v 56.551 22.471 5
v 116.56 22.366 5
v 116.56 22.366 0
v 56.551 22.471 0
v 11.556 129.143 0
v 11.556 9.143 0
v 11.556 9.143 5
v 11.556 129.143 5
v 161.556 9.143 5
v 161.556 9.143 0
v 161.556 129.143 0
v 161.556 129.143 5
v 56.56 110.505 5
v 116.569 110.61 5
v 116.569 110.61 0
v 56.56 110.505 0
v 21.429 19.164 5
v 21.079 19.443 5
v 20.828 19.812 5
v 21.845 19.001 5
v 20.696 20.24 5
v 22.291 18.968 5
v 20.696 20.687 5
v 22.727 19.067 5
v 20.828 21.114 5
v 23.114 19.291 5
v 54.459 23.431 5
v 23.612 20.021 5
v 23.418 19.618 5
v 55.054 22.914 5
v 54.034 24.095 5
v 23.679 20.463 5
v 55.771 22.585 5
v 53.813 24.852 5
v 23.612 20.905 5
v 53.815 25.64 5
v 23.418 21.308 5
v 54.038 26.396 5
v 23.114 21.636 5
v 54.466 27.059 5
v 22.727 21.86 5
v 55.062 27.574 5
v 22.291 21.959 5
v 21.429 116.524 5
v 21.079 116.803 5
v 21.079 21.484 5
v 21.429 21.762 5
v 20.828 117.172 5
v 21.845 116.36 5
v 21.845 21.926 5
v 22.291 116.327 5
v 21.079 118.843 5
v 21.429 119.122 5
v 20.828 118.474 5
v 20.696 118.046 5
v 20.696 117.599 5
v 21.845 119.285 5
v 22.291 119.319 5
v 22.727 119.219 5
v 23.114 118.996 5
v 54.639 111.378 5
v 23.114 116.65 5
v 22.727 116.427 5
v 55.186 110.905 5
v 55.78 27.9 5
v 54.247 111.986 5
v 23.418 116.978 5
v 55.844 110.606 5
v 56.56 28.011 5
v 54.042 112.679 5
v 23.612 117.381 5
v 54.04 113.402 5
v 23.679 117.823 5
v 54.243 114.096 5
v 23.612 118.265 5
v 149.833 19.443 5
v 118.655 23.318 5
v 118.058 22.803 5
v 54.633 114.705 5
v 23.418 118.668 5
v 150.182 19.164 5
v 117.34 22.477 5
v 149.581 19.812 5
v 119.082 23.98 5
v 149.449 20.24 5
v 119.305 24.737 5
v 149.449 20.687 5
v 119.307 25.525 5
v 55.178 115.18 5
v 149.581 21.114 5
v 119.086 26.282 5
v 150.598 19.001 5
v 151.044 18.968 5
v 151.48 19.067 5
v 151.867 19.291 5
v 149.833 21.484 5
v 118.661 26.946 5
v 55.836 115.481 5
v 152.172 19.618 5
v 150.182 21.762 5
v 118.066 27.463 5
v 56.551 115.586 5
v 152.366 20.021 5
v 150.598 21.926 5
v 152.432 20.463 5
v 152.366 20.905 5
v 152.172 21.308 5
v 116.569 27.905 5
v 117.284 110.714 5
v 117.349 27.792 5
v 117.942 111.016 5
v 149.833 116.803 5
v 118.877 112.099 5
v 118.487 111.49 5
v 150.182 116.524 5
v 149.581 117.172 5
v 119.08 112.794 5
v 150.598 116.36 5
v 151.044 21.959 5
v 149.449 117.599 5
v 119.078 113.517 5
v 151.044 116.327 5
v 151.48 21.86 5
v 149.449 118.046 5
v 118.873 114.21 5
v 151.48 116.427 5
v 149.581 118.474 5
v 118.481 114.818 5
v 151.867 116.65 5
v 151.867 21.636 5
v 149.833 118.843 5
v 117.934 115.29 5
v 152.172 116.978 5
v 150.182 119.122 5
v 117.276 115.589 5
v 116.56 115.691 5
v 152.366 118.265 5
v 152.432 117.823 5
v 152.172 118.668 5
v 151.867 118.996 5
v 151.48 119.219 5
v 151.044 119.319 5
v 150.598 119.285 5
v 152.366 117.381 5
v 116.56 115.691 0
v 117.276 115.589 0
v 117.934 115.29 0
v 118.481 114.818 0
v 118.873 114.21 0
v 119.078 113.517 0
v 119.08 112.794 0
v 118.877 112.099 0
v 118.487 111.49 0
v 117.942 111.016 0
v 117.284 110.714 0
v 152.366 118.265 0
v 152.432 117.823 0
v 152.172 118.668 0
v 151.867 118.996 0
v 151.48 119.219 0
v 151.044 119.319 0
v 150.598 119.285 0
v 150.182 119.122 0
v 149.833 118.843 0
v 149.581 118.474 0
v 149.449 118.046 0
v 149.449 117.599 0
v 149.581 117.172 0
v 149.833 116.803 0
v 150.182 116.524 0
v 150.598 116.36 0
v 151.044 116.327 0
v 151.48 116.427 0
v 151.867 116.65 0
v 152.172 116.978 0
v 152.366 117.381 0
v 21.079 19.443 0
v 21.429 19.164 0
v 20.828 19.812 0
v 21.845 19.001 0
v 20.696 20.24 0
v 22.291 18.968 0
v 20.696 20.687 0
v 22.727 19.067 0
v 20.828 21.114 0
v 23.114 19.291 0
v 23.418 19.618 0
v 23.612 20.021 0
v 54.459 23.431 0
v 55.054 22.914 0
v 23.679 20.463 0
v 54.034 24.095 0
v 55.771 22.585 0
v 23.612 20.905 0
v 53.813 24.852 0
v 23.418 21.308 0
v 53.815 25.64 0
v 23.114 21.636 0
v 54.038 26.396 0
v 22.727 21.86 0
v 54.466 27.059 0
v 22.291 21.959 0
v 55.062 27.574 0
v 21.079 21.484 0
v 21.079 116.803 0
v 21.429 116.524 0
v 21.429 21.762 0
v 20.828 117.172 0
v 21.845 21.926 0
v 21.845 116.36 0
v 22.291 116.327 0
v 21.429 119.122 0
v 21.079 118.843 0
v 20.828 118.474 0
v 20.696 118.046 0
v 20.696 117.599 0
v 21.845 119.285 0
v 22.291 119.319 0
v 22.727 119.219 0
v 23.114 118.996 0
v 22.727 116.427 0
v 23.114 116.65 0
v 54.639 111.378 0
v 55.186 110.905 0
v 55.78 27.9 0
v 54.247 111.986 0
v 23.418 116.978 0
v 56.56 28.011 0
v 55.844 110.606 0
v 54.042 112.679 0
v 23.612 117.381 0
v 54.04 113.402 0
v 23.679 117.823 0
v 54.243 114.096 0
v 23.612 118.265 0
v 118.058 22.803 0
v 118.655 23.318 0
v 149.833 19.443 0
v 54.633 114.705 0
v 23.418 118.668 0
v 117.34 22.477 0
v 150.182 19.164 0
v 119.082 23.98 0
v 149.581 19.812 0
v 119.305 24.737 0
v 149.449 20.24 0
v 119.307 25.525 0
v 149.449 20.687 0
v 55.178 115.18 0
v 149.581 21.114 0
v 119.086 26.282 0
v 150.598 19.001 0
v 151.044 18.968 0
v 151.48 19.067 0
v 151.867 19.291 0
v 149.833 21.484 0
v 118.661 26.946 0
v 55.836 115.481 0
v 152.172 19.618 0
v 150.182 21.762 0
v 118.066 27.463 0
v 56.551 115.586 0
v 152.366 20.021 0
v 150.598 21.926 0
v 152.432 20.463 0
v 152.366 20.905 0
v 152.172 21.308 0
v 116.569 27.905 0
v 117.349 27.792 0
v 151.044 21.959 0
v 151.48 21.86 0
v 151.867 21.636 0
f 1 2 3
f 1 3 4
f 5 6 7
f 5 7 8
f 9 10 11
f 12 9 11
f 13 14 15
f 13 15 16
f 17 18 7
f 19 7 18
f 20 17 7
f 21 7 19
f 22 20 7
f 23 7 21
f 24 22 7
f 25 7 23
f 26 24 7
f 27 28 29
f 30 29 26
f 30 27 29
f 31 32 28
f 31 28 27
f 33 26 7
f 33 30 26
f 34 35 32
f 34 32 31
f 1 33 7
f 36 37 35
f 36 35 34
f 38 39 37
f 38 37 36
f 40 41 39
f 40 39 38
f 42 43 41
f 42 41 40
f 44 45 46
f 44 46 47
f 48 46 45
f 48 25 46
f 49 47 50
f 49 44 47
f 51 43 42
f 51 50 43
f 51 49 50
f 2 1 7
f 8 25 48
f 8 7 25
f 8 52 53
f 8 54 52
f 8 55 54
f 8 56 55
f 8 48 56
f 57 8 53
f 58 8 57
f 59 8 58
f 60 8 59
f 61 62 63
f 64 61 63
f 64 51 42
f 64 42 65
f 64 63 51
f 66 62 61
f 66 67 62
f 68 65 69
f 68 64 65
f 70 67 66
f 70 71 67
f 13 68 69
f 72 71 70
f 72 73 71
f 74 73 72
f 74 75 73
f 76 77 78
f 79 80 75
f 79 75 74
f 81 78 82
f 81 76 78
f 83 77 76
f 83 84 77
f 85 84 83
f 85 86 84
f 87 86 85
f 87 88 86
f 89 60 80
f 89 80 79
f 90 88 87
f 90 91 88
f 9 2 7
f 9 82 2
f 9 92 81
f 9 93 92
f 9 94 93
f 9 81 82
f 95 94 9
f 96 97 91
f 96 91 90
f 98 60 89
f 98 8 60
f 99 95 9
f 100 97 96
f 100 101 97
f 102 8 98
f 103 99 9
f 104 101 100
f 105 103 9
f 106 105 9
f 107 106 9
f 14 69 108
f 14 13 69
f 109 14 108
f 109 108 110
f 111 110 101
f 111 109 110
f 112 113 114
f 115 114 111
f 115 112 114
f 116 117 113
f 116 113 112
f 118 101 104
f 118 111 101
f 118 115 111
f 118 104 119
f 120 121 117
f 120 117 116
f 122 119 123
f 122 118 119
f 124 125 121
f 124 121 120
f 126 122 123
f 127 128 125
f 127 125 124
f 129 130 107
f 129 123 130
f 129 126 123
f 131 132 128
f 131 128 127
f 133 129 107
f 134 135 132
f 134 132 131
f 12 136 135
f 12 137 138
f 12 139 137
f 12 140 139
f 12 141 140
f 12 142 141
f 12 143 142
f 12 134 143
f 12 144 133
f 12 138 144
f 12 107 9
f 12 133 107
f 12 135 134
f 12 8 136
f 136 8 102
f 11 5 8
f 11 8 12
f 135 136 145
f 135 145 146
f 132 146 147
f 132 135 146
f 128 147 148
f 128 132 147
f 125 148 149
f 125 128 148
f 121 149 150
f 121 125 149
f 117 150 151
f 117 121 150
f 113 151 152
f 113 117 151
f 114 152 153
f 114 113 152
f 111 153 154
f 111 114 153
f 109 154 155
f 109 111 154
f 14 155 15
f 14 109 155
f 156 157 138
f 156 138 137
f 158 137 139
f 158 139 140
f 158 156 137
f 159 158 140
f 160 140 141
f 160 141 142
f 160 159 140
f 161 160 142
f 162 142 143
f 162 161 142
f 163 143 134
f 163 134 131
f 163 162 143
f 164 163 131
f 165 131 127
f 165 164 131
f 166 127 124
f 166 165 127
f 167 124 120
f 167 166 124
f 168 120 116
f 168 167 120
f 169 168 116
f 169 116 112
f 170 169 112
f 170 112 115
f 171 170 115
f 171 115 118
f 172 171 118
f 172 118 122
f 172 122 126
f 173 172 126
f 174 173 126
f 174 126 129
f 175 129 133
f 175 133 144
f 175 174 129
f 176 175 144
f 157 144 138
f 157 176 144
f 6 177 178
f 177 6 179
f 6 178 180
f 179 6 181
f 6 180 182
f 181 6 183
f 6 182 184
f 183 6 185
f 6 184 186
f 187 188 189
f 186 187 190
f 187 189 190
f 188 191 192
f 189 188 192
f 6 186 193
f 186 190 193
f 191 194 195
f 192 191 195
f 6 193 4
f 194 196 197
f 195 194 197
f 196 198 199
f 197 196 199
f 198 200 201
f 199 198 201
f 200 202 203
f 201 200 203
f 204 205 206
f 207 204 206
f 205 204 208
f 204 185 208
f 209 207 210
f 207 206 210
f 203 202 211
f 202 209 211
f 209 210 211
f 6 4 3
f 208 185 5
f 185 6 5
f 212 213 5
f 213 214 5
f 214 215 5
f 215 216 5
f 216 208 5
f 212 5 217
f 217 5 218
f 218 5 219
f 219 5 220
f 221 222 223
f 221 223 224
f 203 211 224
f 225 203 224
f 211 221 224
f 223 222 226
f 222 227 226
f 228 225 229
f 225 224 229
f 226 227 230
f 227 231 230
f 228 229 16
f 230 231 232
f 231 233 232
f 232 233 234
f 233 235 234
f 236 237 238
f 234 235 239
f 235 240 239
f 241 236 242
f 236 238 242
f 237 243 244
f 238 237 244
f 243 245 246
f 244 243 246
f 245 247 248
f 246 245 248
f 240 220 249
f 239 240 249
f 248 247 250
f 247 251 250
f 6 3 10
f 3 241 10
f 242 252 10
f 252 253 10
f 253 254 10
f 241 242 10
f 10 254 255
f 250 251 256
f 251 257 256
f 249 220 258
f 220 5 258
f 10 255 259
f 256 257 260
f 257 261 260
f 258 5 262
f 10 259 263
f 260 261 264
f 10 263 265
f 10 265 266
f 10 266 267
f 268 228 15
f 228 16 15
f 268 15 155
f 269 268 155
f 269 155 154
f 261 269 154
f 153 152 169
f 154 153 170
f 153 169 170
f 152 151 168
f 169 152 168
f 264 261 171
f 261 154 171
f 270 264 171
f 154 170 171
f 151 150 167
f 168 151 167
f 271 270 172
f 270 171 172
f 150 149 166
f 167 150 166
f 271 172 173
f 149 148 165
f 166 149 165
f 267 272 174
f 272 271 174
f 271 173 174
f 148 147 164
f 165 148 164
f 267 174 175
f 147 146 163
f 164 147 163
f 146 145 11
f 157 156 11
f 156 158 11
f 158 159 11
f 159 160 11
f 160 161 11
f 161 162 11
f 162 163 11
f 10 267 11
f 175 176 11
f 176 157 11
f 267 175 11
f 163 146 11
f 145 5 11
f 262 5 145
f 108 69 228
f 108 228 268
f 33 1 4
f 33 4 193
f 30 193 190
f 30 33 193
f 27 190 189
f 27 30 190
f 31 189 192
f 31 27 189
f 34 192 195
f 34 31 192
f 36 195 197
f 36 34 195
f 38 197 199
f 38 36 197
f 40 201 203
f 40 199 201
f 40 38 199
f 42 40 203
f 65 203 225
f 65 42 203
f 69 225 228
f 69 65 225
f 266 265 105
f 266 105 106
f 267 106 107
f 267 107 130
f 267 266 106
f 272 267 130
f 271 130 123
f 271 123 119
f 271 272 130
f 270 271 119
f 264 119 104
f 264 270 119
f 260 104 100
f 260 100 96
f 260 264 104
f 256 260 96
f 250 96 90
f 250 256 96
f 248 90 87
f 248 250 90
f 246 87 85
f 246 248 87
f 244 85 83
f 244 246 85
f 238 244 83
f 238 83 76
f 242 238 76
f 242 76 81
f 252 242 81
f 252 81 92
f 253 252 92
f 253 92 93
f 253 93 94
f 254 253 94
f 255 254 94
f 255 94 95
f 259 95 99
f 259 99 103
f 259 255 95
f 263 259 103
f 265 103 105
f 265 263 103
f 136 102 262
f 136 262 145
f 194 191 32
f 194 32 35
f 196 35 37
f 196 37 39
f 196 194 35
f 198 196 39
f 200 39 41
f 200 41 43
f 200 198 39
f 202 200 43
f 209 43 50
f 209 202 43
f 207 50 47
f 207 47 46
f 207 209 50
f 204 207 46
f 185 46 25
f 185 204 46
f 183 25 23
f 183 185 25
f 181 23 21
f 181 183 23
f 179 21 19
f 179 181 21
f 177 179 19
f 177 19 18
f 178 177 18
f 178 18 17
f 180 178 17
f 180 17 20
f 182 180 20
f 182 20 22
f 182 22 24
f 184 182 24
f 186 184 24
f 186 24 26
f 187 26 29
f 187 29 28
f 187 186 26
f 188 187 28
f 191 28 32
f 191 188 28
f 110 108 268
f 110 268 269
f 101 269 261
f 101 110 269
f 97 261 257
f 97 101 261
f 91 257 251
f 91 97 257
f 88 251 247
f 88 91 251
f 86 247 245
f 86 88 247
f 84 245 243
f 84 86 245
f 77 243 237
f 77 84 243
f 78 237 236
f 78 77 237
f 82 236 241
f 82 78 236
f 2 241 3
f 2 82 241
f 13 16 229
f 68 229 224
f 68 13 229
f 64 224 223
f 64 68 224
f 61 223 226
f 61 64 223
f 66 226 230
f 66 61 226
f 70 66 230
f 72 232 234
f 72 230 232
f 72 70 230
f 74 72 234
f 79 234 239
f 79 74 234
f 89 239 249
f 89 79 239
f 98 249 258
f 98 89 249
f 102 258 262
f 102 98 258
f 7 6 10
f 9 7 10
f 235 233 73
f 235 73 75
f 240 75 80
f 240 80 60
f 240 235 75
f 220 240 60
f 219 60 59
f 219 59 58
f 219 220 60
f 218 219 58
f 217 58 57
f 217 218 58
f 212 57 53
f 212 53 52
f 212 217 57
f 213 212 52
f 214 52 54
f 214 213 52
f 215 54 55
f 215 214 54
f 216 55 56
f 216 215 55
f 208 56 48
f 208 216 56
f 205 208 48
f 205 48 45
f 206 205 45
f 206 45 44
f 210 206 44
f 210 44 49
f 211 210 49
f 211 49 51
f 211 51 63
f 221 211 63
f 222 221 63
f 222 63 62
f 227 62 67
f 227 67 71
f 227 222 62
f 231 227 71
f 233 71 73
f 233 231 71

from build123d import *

# Parameters (mm, degrees)
MODEL_W             = 150
MODEL_H             = 120
MODEL_R             = 1.5
BOSS_EXTRUDE1_DEPTH = 5
CUT_EXTRUDE1_DEPTH  = 207.889226408


with BuildPart() as part:
    # Model → Boss-Extrude1 (new body)
    with BuildSketch(Plane.XY):
        with Locations((86.555612284, 69.143083993)):
            Rectangle(MODEL_W, MODEL_H)
        with Locations((22.178986017, 117.822854057)):
            Circle(MODEL_R, mode=Mode.SUBTRACT)
        with Locations((150.932238551, 117.822854057)):
            Circle(MODEL_R, mode=Mode.SUBTRACT)
        with Locations((22.178986017, 20.46331393)):
            Circle(MODEL_R, mode=Mode.SUBTRACT)
        with Locations((150.932238551, 20.46331393)):
            Circle(MODEL_R, mode=Mode.SUBTRACT)
    extrude(amount=BOSS_EXTRUDE1_DEPTH)

    # Sketch2 → Cut-Extrude1 (cut, through all)
    with BuildSketch(Plane.XY.offset(5)):
        with BuildLine():
            Line((56.551143806, 115.585597336), (116.559939574, 115.69114655))
            ThreePointArc((116.559939574, 115.69114655), (119.104909718, 113.155113361), (116.568876529, 110.610143217))
            Line((116.568876529, 110.610143217), (56.560080761, 110.504594003))
            ThreePointArc((56.560080761, 110.504594003), (54.015110617, 113.040627192), (56.551143806, 115.585597336))
        make_face()
        with BuildLine():
            Line((56.560484104, 28.010889901), (116.569279872, 27.905340687))
            ThreePointArc((116.569279872, 27.905340687), (119.334225635, 25.130651283), (116.559536231, 22.36570552))
            Line((116.559536231, 22.36570552), (56.550740464, 22.471254734))
            ThreePointArc((56.550740464, 22.471254734), (53.7857947, 25.245944138), (56.560484104, 28.010889901))
        make_face()
    extrude(amount=-CUT_EXTRUDE1_DEPTH, mode=Mode.SUBTRACT)


solid = part.part
